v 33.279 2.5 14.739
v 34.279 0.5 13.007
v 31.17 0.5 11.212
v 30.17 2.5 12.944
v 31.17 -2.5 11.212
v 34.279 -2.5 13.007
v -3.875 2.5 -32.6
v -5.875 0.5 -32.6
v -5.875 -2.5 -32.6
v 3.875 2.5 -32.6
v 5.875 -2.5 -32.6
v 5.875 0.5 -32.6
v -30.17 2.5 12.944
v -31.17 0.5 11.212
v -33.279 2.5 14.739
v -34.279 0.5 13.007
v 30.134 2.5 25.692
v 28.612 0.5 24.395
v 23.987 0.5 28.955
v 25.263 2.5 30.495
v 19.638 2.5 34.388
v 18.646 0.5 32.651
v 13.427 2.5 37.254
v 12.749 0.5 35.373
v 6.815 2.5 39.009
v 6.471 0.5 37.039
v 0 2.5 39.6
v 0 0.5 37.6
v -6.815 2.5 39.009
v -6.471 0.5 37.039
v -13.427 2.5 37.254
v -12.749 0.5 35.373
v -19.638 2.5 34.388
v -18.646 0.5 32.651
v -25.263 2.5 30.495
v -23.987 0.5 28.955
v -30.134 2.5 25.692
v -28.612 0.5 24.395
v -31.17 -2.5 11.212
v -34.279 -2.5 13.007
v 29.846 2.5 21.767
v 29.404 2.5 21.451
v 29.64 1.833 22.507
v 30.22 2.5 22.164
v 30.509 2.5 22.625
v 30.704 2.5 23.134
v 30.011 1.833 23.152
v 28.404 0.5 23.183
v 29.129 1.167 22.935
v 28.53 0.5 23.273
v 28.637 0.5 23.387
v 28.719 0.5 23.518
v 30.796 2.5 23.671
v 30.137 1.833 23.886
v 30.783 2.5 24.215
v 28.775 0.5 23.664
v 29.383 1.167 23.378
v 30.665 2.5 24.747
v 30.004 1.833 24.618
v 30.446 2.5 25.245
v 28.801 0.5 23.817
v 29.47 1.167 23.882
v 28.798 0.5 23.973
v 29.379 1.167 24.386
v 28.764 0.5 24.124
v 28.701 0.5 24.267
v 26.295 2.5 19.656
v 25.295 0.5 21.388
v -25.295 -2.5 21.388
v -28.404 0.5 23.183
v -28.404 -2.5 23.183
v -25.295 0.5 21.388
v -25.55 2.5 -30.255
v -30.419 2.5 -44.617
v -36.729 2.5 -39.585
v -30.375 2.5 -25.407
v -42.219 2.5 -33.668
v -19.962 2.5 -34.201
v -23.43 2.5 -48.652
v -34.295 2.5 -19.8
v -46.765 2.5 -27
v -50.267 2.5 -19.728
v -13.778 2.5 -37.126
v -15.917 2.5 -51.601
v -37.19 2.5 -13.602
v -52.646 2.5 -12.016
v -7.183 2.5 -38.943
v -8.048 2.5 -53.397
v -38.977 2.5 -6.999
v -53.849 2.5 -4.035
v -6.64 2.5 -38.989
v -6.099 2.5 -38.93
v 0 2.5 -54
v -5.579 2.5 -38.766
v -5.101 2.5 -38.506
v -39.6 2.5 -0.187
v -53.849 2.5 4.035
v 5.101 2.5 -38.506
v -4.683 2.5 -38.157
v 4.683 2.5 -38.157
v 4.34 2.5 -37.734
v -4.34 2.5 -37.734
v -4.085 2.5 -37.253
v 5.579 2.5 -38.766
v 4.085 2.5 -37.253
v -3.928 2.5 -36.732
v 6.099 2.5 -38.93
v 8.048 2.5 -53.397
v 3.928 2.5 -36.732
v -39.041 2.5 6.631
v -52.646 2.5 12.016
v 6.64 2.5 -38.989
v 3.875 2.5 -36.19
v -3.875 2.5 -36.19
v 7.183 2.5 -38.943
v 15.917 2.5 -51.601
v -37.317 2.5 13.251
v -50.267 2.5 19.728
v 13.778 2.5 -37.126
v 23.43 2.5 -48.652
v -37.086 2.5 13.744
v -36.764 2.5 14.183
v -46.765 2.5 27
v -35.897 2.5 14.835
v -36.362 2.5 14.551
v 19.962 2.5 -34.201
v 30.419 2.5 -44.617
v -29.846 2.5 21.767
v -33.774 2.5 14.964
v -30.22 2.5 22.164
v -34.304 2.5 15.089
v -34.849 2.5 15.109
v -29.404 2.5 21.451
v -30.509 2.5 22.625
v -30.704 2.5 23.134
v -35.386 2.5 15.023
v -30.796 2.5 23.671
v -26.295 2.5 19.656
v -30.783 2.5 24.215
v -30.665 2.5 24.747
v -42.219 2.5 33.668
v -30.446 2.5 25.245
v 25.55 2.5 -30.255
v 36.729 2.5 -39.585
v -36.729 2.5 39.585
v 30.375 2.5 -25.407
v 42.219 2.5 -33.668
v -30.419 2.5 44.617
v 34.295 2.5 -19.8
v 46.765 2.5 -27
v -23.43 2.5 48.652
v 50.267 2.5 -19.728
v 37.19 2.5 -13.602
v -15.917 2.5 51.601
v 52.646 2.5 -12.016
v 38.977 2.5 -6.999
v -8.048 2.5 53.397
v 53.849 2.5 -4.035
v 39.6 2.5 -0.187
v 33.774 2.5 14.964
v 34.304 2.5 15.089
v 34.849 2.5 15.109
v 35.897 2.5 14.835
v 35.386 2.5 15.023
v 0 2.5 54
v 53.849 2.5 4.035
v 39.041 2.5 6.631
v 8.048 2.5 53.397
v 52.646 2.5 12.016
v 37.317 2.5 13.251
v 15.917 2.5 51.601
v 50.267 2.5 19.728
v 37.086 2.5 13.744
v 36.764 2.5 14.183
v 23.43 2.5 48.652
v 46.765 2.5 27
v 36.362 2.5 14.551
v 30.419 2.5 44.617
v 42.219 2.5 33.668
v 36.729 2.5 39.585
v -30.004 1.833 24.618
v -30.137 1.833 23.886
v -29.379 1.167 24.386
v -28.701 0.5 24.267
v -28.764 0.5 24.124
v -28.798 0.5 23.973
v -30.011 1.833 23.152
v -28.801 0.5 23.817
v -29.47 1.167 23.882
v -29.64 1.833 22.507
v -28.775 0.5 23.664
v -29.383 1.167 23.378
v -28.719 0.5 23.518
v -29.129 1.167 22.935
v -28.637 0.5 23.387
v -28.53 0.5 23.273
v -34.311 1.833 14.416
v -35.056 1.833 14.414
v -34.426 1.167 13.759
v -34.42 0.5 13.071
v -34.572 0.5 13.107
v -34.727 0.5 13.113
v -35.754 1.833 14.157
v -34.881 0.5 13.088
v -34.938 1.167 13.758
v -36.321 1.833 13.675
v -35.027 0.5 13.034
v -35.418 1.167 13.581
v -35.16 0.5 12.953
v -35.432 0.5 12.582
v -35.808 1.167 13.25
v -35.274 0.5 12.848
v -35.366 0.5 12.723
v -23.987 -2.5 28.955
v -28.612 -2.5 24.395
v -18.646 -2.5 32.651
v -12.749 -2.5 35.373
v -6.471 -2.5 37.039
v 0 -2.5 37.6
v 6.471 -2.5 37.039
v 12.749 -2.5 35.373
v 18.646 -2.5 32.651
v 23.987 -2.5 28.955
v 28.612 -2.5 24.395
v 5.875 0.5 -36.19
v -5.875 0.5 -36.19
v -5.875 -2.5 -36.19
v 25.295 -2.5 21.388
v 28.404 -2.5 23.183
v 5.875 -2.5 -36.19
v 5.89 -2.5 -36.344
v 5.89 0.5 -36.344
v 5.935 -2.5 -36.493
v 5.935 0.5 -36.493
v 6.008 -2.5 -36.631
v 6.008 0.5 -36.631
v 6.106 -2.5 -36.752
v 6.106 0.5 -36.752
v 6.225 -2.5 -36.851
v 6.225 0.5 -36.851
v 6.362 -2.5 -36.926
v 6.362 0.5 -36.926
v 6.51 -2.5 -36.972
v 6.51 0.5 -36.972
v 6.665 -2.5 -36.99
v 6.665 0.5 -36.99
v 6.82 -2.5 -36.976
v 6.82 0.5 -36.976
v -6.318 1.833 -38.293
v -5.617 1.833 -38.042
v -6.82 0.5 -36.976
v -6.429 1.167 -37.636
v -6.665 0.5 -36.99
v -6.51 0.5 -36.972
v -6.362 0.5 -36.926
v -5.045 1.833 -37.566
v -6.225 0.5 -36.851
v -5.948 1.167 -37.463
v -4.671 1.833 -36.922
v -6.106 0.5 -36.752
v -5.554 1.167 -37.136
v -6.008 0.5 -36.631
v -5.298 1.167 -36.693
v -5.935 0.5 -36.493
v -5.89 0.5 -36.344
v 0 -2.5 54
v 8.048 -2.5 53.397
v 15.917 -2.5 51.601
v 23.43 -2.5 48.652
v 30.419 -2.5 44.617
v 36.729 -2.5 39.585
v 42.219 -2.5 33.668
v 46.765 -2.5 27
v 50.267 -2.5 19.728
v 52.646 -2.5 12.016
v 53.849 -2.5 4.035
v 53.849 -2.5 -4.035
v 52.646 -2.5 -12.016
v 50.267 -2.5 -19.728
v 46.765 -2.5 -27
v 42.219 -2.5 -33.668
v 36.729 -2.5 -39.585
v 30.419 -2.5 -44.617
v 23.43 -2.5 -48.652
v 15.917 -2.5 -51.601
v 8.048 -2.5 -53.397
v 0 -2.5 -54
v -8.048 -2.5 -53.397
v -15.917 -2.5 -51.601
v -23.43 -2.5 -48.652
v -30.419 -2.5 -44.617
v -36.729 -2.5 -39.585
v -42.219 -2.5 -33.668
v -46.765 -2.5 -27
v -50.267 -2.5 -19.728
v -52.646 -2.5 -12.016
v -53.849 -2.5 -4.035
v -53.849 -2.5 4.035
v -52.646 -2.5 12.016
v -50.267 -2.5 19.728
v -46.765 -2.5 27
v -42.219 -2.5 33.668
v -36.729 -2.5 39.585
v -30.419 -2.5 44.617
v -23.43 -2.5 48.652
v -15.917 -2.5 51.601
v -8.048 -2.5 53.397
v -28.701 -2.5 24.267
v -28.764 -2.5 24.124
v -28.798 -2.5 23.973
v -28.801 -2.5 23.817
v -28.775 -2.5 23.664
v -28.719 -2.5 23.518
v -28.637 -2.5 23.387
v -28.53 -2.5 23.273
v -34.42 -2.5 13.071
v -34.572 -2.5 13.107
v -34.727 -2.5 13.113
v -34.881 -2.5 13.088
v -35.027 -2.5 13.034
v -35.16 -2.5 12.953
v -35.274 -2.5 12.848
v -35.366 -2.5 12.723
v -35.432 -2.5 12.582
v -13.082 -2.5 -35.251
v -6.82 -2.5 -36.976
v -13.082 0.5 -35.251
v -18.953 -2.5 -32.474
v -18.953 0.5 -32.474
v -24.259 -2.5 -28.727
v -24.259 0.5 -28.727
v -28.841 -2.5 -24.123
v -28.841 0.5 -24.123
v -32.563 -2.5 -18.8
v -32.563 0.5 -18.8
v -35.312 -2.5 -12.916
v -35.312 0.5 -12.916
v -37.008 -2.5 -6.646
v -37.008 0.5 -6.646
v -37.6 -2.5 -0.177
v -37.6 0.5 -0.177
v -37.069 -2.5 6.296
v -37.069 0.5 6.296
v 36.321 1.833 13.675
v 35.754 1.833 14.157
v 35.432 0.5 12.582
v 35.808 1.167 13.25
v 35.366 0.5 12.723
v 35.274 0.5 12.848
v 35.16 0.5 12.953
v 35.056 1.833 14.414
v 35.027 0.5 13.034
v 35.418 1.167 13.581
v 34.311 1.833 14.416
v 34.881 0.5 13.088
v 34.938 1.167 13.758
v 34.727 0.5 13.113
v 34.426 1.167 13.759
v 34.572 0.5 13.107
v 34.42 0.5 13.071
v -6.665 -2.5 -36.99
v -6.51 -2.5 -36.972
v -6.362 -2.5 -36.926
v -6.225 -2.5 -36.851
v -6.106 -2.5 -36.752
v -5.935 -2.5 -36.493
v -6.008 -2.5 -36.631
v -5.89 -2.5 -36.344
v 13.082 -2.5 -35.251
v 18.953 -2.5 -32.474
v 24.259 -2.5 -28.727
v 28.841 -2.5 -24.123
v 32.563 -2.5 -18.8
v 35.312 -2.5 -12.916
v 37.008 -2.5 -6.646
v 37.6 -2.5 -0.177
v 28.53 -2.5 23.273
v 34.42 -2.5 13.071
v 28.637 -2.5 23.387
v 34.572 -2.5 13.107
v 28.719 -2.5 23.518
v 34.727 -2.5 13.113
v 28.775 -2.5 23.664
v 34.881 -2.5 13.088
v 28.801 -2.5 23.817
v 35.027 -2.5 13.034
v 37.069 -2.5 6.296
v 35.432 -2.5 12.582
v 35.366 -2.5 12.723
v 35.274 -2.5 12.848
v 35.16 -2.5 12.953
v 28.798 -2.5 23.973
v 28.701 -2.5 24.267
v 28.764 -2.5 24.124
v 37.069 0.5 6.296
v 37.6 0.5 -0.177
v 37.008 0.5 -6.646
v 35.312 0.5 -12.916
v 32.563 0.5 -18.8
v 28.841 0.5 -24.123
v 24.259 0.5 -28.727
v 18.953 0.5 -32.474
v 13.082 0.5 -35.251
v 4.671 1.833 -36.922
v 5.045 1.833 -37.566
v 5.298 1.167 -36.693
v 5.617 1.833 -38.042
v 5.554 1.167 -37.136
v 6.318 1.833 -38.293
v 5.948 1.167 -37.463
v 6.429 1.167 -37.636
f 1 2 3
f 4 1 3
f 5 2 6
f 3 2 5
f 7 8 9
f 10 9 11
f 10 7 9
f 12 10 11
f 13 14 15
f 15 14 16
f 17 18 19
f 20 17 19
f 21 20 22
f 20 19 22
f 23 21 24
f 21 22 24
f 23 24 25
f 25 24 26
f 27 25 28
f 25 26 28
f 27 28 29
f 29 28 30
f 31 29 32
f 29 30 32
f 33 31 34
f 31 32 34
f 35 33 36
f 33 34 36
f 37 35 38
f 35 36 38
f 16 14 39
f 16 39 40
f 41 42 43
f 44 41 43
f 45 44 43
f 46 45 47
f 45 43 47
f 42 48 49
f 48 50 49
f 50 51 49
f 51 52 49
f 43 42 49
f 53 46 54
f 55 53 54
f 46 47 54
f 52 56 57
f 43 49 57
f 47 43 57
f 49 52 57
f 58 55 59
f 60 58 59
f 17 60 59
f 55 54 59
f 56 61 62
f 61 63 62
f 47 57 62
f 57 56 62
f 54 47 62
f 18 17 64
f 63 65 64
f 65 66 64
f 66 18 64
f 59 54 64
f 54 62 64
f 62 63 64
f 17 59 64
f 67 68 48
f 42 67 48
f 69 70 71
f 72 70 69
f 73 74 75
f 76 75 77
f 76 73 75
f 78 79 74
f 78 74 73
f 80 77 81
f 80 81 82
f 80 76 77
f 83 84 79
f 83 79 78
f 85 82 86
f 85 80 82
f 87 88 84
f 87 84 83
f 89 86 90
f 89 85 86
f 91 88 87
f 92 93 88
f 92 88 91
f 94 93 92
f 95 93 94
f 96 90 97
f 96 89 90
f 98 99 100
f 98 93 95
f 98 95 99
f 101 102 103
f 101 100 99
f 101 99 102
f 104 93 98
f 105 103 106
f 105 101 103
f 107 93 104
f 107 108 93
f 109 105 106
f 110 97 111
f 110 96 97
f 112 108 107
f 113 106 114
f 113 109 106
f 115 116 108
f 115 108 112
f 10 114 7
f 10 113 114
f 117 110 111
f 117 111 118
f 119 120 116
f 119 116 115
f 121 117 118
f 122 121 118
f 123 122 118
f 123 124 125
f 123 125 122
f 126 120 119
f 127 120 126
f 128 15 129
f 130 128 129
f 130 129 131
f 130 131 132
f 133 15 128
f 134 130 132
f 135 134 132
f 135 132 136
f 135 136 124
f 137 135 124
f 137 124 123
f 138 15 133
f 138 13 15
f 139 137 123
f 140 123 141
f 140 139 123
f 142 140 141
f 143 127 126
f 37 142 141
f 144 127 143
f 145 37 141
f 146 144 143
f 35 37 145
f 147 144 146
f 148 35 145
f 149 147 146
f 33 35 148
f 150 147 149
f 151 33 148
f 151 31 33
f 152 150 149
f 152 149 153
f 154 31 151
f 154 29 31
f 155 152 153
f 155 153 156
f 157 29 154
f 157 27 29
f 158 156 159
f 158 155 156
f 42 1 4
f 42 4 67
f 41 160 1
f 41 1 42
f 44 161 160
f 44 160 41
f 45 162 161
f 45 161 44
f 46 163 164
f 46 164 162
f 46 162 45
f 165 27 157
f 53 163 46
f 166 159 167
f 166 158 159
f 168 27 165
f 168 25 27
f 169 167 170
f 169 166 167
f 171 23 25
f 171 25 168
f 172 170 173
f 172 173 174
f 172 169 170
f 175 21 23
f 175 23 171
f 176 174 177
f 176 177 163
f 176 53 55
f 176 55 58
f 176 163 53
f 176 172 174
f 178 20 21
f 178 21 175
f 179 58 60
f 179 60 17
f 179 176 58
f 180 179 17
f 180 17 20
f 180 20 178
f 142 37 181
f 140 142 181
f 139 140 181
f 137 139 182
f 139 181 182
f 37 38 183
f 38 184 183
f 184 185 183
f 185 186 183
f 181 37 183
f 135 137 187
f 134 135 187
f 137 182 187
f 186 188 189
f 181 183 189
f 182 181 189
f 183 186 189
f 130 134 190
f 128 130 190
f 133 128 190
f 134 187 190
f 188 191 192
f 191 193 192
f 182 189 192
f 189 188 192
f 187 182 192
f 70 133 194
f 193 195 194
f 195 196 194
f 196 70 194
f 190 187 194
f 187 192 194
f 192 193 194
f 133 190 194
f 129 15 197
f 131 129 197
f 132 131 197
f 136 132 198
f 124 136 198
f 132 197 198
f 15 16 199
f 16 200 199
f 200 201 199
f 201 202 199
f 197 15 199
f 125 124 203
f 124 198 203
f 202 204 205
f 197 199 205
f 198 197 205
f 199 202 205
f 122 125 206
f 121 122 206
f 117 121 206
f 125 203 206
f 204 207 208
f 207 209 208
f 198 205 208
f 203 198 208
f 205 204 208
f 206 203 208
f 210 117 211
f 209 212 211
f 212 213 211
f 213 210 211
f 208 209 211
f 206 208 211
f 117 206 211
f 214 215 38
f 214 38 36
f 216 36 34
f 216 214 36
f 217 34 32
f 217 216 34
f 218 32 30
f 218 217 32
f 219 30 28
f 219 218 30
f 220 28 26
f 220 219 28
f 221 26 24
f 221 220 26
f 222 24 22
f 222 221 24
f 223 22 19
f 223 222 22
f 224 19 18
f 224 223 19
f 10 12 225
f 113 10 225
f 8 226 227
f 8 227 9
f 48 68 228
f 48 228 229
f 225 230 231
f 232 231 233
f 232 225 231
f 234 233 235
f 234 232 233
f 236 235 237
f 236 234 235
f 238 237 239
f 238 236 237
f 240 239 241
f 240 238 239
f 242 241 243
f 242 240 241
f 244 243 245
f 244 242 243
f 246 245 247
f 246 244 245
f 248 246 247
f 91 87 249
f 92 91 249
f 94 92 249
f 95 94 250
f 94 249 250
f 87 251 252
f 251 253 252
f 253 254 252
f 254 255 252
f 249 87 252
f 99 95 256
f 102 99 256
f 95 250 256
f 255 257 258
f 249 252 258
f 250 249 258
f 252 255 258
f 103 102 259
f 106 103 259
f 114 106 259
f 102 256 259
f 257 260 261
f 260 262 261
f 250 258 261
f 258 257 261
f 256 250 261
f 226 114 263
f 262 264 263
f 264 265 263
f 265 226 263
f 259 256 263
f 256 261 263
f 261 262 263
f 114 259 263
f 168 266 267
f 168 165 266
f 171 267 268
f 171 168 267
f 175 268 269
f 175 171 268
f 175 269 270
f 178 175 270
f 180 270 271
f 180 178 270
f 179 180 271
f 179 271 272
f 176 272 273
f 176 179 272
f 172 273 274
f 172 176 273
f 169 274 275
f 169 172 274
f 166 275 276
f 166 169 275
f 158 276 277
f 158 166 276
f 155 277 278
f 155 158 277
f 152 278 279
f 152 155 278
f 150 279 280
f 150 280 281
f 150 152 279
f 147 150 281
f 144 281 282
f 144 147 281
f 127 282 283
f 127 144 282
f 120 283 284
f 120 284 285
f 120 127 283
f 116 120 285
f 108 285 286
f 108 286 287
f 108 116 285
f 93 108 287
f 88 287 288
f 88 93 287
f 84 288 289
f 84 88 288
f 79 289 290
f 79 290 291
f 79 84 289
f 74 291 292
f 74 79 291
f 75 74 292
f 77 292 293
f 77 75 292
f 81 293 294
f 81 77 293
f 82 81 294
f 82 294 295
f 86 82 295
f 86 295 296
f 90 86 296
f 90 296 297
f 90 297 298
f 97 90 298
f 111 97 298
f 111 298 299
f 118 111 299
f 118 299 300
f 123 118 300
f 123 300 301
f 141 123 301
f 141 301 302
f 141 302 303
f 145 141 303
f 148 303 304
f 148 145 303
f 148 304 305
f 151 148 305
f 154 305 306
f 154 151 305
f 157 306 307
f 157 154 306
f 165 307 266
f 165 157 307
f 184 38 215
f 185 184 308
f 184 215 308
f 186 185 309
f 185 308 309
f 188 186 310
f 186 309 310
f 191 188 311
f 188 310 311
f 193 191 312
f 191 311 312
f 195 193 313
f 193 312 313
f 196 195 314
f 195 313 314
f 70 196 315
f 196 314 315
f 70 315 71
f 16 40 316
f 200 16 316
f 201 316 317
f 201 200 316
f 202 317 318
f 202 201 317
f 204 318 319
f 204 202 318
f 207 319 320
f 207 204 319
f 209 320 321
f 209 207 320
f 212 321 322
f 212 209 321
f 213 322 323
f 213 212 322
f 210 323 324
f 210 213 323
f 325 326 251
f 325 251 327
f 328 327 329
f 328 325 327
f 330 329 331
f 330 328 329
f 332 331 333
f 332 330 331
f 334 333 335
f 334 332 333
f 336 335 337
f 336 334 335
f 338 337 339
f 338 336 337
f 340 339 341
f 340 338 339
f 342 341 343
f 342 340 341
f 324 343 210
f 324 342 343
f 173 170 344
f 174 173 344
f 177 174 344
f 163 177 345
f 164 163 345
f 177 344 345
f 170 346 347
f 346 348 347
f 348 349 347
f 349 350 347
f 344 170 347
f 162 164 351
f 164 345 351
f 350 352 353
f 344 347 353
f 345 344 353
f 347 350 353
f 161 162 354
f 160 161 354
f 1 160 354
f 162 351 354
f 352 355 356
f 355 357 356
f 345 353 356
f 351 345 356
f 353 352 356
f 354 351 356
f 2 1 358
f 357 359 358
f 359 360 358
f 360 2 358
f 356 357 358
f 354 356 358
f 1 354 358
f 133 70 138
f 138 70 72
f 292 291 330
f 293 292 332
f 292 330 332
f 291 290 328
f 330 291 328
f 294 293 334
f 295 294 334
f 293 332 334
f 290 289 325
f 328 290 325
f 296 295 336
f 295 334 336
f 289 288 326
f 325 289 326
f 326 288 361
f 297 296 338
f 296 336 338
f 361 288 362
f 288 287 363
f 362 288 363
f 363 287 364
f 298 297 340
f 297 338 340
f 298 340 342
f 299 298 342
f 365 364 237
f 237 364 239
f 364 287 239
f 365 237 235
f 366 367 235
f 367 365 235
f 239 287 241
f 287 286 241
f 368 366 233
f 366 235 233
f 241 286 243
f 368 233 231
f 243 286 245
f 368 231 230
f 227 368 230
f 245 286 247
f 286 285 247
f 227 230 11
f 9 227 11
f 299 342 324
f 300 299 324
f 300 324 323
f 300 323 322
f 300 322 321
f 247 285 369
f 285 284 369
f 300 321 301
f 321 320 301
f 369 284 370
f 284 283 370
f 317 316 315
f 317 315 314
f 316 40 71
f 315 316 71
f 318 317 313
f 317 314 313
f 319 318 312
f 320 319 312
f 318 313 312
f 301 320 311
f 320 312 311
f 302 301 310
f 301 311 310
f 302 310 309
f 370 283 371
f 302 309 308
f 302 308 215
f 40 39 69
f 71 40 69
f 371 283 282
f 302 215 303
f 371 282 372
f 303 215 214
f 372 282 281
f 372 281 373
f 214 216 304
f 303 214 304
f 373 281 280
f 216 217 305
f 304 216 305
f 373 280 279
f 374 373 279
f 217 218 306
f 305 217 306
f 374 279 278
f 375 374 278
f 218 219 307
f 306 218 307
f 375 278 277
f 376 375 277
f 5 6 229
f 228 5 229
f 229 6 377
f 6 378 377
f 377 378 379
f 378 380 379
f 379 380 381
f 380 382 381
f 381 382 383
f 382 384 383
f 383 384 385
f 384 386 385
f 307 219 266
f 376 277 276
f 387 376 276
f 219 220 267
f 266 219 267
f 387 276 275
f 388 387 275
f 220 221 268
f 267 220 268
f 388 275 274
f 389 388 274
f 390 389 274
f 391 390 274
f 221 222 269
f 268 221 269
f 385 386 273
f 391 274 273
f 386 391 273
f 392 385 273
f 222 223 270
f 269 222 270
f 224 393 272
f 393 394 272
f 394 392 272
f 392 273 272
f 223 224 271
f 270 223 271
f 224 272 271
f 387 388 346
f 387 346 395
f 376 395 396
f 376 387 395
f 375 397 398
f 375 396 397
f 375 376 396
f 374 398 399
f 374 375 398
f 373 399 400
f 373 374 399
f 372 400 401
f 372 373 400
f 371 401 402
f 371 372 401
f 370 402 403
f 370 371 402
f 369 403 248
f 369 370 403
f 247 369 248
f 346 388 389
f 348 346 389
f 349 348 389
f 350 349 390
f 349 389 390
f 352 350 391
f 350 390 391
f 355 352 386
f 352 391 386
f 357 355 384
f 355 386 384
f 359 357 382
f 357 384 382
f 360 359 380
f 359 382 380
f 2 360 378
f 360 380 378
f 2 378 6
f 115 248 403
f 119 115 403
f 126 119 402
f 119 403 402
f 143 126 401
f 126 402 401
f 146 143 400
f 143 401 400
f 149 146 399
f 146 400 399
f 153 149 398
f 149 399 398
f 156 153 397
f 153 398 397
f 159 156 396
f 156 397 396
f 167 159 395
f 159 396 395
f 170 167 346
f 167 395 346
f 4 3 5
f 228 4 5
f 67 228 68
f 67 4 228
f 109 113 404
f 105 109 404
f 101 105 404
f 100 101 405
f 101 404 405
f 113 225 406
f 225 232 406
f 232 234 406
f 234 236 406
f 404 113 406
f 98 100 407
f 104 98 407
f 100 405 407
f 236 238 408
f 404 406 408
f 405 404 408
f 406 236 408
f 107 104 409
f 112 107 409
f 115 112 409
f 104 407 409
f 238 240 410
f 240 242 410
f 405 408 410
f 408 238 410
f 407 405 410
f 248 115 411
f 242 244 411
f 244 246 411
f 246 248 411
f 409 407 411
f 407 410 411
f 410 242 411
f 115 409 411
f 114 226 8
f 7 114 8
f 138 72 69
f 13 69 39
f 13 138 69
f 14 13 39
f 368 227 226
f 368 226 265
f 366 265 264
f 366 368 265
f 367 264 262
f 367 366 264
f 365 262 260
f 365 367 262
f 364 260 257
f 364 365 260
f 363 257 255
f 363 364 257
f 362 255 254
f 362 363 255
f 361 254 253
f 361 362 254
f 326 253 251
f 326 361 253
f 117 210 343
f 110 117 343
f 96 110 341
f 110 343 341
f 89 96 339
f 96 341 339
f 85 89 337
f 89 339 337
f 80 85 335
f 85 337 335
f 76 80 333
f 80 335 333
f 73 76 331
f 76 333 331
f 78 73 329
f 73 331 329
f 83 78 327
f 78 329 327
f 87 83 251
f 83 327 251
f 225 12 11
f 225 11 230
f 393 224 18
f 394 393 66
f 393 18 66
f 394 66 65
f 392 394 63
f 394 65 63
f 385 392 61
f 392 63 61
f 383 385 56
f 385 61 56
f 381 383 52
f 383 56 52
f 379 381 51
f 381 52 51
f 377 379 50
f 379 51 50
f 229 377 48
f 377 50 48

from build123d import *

# Parameters (mm, degrees)
SKETCH1_R                = 54
SKETCH1_R_2              = 37.6
BOSS_EXTRUDE1_DEPTH      = 2.5
BOSS_EXTRUDE2_DEPTH      = 2.5
FILLET1_R                = 0.8
CIRPATTERN1_COUNT        = 3
FILLET1_OF_CIRPATTERN1_R = 0.8
CHAMFER2_SIZE            = 2


with BuildPart() as part:
    # Sketch1 → Boss-Extrude1 (new, symmetric)
    with BuildSketch(Plane(origin=(0, 0, 0), x_dir=(1, 0, 0), z_dir=(0, 1, 0))):
        with Locations(Location((0, 0, 0), (0, 0, 270))):
            Circle(SKETCH1_R)
        with Locations(Location((0, 0, 0), (0, 0, 270))):
            Circle(SKETCH1_R_2, mode=Mode.SUBTRACT)
    extrude(amount=BOSS_EXTRUDE1_DEPTH, both=True)

    # Sketch2 → Boss-Extrude2 (add, symmetric)
    with BuildSketch(Plane(origin=(0, 0, 0), x_dir=(1, 0, 0), z_dir=(0, 1, 0))):
        with BuildLine():
            Line((-5.875, 32.6), (5.875, 32.6))
            Line((5.875, 32.6), (5.875, 37.138179479))
            ThreePointArc((5.875, 37.138179479), (0, 37.6), (-5.875, 37.138179479))
            Line((-5.875, 37.138179479), (-5.875, 32.6))
        make_face()
    boss_extrude2 = extrude(amount=BOSS_EXTRUDE2_DEPTH, both=True)

    # Fillet1
    fillet1_edges = [part.edges().sort_by_distance(p)[0] for p in [
        (-5.875, 0, -37.138179479),
        (5.875, 0, -37.138179479),
    ]]
    fillet(fillet1_edges, radius=FILLET1_R)

    # CirPattern1: Boss-Extrude2 ×3 about axis
    cirpattern1_axis = Axis((0, 0, 0), (0, 1, 0))
    for i in range(1, CIRPATTERN1_COUNT):
        add(boss_extrude2.rotate(cirpattern1_axis, i * 360 / CIRPATTERN1_COUNT))

    # Fillet1 of CirPattern1
    fillet1_of_cirpattern1_edges = [part.edges().sort_by_distance(p)[0] for p in [
        (-29.225106879, 0, 23.656988987),
        (-35.100106879, 0, 13.481190492),
        (35.100106879, 0, 13.481190492),
        (29.225106879, 0, 23.656988987),
    ]]
    fillet(fillet1_of_cirpattern1_edges, radius=FILLET1_OF_CIRPATTERN1_R)

    # Chamfer2
    chamfer2_edges = [part.edges().sort_by_distance(p)[0] for p in [
        (5.875, 2.5, -34.394780843),
        (-32.562555182, 2.5, -18.8),
        (-5.875, 2.5, -34.394780843),
        (6.163183117, 2.5, -36.804414089),
        (-6.163183117, 2.5, -36.804414089),
        (26.849253967, 2.5, 22.285289669),
        (-32.724253967, 2.5, 12.109491174),
        (32.724253967, 2.5, 12.109491174),
        (32.562555182, 2.5, -18.8),
        (28.791966014, 2.5, 23.739680192),
        (34.955149131, 2.5, 13.064733897),
        (-26.849253967, 2.5, 22.285289669),
        (0, 2.5, 37.6),
        (-34.955149131, 2.5, 13.064733897),
        (-28.791966014, 2.5, 23.739680192),
    ]]
    chamfer(chamfer2_edges, length=CHAMFER2_SIZE)


solid = part.part
